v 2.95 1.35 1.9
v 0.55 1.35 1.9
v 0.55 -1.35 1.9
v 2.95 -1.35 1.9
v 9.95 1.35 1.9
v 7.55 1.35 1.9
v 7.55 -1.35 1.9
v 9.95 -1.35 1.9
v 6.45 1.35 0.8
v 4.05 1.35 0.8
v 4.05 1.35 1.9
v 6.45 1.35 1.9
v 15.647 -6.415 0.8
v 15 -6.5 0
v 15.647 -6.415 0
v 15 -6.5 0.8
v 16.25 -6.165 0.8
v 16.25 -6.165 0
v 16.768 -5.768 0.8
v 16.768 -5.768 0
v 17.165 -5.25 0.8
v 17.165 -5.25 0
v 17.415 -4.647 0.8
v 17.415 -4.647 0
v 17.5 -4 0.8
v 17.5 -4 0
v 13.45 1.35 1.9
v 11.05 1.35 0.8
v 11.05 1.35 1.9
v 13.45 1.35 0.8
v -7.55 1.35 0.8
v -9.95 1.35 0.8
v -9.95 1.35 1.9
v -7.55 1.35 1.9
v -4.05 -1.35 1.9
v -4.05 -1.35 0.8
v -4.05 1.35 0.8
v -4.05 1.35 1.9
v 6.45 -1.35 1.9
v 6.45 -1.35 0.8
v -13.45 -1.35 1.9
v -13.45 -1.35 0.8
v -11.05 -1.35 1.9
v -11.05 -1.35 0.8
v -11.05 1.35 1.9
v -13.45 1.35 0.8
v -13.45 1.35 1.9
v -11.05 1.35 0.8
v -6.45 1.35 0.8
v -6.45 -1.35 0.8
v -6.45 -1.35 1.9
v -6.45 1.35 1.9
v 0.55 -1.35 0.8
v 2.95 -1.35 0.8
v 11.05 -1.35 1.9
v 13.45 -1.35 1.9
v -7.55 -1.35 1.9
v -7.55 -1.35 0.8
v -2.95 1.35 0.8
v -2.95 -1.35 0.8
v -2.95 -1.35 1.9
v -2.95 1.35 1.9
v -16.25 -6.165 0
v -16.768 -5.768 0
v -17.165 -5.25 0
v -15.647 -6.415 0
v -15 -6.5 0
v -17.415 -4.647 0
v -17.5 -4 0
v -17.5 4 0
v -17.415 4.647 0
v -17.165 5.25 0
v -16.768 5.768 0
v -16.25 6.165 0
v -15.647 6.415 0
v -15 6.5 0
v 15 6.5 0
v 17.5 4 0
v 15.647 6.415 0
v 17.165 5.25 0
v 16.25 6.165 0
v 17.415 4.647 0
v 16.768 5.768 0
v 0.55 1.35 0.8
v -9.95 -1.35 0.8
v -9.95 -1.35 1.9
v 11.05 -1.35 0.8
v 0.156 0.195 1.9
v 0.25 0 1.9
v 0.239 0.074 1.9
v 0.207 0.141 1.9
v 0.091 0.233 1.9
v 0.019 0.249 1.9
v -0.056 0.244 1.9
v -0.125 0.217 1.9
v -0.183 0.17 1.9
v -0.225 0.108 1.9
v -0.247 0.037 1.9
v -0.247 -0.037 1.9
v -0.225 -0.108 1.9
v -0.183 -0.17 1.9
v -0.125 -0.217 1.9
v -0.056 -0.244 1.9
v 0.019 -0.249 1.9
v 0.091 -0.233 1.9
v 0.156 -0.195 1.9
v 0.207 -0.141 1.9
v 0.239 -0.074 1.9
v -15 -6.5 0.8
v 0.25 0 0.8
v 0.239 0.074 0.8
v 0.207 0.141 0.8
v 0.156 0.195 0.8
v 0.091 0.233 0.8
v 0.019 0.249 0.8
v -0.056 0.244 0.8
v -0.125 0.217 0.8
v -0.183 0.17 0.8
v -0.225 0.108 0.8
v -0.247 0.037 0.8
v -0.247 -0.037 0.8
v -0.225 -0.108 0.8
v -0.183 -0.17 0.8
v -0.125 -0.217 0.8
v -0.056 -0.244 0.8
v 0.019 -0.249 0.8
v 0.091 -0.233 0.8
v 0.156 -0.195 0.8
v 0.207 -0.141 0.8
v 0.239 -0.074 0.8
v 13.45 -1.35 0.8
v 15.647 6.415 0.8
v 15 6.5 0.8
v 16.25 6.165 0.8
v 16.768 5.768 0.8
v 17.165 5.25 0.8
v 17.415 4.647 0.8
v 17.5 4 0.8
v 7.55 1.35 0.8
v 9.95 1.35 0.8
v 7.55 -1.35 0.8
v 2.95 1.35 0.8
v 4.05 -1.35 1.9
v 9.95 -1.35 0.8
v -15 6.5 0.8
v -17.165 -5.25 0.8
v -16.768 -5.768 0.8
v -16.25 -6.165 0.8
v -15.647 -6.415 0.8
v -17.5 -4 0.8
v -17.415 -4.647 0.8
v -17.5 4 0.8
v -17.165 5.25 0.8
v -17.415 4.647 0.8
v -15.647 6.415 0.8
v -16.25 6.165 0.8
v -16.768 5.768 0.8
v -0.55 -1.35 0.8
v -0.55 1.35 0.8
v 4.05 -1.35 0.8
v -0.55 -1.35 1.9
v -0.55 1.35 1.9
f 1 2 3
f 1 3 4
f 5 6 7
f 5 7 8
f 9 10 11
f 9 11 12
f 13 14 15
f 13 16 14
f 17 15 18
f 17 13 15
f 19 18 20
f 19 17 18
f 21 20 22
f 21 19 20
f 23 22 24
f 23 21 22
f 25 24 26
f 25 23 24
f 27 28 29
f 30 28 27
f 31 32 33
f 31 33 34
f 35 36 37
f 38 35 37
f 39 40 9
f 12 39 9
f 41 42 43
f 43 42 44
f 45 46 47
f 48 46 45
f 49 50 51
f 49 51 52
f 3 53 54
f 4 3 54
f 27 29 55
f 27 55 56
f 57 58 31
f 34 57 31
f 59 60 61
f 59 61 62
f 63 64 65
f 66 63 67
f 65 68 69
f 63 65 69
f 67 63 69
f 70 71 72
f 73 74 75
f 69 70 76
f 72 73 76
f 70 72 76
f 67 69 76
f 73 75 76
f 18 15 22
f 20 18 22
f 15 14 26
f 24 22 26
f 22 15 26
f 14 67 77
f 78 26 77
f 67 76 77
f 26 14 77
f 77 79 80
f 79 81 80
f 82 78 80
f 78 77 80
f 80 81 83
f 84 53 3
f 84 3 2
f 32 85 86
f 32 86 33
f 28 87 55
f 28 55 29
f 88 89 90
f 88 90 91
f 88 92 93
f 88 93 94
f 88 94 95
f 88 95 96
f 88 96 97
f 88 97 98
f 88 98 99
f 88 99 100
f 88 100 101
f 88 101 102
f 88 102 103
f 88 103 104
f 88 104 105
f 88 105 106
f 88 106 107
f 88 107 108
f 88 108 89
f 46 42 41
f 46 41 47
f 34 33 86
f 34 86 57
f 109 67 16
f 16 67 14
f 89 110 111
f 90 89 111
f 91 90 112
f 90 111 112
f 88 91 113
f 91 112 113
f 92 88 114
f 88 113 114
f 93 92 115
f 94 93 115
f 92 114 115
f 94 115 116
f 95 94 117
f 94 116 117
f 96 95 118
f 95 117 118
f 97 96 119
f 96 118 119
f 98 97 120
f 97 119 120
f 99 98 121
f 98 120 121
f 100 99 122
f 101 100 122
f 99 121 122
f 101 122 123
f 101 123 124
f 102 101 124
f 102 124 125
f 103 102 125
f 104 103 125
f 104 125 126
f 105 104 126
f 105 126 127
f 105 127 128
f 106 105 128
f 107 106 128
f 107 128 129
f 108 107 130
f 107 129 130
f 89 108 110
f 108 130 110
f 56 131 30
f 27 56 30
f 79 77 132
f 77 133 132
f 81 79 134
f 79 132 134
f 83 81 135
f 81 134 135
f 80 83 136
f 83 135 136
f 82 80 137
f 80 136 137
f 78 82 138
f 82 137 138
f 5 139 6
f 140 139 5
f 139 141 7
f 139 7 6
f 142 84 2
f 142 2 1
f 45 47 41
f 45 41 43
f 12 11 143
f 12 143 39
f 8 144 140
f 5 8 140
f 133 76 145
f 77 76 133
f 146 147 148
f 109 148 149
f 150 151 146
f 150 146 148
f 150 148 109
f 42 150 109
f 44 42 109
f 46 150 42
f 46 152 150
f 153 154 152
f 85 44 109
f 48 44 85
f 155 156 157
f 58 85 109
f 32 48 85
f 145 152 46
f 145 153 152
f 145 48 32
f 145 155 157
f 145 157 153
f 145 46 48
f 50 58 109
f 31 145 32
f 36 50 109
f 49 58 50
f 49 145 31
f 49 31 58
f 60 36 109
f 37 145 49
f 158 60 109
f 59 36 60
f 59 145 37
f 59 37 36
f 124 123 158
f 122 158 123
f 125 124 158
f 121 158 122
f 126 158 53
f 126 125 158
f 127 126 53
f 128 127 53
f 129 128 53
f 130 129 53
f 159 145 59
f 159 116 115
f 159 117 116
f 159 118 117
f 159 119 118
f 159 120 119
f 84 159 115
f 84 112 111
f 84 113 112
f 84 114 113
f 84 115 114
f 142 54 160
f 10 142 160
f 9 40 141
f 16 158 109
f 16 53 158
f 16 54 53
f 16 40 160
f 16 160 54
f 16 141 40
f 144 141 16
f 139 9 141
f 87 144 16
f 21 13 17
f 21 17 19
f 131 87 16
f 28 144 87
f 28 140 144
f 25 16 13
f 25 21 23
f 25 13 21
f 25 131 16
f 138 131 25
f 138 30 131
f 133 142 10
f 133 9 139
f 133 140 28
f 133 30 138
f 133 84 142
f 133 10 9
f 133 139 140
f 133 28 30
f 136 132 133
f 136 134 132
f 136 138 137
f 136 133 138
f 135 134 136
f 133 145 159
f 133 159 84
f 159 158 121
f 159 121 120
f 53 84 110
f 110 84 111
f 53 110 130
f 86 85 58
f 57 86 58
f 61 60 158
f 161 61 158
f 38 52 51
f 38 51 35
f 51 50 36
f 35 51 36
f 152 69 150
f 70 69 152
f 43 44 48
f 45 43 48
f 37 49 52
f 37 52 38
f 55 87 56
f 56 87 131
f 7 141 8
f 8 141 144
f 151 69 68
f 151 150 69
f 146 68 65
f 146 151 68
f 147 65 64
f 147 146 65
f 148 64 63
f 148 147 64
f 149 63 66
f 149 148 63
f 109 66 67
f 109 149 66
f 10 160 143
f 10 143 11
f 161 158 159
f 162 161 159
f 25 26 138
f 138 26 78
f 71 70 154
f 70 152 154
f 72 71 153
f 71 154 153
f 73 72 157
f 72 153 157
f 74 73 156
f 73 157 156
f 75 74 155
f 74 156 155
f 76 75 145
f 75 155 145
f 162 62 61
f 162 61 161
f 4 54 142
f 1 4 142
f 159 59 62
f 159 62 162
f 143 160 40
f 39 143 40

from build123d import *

# Parameters (mm, degrees)
F0_W     = 35
F0_H     = 13
F1_DEPTH = 0.8
F2_W     = 2.4
F2_H     = 2.7
F3_DEPTH = 1.1
F4_R     = 2.5
F5_R     = 0.25
F6_DEPTH = 1.1


# Not quite as in the source:
# - a feature names something its author has since deleted; it is built from what else it names


with BuildPart() as f1:
    # F0 (on Top) → F1 (new body)
    with BuildSketch(Plane.XY):
        Rectangle(F0_W, F0_H)
    extrude(amount=F1_DEPTH)

    # F2 (on face) → F3 (join)
    with BuildSketch(Plane.XY.offset(0.8)):
        with Locations((-12.25, 0)):
            Rectangle(F2_W, F2_H)
        with Locations((-8.75, 0)):
            Rectangle(F2_W, F2_H)
        with Locations((-5.25, 0)):
            Rectangle(F2_W, F2_H)
        with Locations((-1.75, 0)):
            Rectangle(F2_W, F2_H)
        with Locations((1.75, 0)):
            Rectangle(F2_W, F2_H)
        with Locations((5.25, 0)):
            Rectangle(F2_W, F2_H)
        with Locations((8.75, 0)):
            Rectangle(F2_W, F2_H)
        with Locations((12.25, 0)):
            Rectangle(F2_W, F2_H)
    extrude(amount=F3_DEPTH)

    # F4
    f4_edges = [f1.edges().sort_by_distance(p)[0] for p in [
        (-17.5, 6.5, 0.4),
        (-17.5, -6.5, 0.4),
        (17.5, -6.5, 0.4),
        (17.5, 6.5, 0.4),
    ]]
    fillet(f4_edges, radius=F4_R)

    # F5 (on face) → F6 (join)
    with BuildSketch(Plane.XY.offset(0.8)):
        Circle(F5_R)
    extrude(amount=F6_DEPTH)


solid = f1.part
